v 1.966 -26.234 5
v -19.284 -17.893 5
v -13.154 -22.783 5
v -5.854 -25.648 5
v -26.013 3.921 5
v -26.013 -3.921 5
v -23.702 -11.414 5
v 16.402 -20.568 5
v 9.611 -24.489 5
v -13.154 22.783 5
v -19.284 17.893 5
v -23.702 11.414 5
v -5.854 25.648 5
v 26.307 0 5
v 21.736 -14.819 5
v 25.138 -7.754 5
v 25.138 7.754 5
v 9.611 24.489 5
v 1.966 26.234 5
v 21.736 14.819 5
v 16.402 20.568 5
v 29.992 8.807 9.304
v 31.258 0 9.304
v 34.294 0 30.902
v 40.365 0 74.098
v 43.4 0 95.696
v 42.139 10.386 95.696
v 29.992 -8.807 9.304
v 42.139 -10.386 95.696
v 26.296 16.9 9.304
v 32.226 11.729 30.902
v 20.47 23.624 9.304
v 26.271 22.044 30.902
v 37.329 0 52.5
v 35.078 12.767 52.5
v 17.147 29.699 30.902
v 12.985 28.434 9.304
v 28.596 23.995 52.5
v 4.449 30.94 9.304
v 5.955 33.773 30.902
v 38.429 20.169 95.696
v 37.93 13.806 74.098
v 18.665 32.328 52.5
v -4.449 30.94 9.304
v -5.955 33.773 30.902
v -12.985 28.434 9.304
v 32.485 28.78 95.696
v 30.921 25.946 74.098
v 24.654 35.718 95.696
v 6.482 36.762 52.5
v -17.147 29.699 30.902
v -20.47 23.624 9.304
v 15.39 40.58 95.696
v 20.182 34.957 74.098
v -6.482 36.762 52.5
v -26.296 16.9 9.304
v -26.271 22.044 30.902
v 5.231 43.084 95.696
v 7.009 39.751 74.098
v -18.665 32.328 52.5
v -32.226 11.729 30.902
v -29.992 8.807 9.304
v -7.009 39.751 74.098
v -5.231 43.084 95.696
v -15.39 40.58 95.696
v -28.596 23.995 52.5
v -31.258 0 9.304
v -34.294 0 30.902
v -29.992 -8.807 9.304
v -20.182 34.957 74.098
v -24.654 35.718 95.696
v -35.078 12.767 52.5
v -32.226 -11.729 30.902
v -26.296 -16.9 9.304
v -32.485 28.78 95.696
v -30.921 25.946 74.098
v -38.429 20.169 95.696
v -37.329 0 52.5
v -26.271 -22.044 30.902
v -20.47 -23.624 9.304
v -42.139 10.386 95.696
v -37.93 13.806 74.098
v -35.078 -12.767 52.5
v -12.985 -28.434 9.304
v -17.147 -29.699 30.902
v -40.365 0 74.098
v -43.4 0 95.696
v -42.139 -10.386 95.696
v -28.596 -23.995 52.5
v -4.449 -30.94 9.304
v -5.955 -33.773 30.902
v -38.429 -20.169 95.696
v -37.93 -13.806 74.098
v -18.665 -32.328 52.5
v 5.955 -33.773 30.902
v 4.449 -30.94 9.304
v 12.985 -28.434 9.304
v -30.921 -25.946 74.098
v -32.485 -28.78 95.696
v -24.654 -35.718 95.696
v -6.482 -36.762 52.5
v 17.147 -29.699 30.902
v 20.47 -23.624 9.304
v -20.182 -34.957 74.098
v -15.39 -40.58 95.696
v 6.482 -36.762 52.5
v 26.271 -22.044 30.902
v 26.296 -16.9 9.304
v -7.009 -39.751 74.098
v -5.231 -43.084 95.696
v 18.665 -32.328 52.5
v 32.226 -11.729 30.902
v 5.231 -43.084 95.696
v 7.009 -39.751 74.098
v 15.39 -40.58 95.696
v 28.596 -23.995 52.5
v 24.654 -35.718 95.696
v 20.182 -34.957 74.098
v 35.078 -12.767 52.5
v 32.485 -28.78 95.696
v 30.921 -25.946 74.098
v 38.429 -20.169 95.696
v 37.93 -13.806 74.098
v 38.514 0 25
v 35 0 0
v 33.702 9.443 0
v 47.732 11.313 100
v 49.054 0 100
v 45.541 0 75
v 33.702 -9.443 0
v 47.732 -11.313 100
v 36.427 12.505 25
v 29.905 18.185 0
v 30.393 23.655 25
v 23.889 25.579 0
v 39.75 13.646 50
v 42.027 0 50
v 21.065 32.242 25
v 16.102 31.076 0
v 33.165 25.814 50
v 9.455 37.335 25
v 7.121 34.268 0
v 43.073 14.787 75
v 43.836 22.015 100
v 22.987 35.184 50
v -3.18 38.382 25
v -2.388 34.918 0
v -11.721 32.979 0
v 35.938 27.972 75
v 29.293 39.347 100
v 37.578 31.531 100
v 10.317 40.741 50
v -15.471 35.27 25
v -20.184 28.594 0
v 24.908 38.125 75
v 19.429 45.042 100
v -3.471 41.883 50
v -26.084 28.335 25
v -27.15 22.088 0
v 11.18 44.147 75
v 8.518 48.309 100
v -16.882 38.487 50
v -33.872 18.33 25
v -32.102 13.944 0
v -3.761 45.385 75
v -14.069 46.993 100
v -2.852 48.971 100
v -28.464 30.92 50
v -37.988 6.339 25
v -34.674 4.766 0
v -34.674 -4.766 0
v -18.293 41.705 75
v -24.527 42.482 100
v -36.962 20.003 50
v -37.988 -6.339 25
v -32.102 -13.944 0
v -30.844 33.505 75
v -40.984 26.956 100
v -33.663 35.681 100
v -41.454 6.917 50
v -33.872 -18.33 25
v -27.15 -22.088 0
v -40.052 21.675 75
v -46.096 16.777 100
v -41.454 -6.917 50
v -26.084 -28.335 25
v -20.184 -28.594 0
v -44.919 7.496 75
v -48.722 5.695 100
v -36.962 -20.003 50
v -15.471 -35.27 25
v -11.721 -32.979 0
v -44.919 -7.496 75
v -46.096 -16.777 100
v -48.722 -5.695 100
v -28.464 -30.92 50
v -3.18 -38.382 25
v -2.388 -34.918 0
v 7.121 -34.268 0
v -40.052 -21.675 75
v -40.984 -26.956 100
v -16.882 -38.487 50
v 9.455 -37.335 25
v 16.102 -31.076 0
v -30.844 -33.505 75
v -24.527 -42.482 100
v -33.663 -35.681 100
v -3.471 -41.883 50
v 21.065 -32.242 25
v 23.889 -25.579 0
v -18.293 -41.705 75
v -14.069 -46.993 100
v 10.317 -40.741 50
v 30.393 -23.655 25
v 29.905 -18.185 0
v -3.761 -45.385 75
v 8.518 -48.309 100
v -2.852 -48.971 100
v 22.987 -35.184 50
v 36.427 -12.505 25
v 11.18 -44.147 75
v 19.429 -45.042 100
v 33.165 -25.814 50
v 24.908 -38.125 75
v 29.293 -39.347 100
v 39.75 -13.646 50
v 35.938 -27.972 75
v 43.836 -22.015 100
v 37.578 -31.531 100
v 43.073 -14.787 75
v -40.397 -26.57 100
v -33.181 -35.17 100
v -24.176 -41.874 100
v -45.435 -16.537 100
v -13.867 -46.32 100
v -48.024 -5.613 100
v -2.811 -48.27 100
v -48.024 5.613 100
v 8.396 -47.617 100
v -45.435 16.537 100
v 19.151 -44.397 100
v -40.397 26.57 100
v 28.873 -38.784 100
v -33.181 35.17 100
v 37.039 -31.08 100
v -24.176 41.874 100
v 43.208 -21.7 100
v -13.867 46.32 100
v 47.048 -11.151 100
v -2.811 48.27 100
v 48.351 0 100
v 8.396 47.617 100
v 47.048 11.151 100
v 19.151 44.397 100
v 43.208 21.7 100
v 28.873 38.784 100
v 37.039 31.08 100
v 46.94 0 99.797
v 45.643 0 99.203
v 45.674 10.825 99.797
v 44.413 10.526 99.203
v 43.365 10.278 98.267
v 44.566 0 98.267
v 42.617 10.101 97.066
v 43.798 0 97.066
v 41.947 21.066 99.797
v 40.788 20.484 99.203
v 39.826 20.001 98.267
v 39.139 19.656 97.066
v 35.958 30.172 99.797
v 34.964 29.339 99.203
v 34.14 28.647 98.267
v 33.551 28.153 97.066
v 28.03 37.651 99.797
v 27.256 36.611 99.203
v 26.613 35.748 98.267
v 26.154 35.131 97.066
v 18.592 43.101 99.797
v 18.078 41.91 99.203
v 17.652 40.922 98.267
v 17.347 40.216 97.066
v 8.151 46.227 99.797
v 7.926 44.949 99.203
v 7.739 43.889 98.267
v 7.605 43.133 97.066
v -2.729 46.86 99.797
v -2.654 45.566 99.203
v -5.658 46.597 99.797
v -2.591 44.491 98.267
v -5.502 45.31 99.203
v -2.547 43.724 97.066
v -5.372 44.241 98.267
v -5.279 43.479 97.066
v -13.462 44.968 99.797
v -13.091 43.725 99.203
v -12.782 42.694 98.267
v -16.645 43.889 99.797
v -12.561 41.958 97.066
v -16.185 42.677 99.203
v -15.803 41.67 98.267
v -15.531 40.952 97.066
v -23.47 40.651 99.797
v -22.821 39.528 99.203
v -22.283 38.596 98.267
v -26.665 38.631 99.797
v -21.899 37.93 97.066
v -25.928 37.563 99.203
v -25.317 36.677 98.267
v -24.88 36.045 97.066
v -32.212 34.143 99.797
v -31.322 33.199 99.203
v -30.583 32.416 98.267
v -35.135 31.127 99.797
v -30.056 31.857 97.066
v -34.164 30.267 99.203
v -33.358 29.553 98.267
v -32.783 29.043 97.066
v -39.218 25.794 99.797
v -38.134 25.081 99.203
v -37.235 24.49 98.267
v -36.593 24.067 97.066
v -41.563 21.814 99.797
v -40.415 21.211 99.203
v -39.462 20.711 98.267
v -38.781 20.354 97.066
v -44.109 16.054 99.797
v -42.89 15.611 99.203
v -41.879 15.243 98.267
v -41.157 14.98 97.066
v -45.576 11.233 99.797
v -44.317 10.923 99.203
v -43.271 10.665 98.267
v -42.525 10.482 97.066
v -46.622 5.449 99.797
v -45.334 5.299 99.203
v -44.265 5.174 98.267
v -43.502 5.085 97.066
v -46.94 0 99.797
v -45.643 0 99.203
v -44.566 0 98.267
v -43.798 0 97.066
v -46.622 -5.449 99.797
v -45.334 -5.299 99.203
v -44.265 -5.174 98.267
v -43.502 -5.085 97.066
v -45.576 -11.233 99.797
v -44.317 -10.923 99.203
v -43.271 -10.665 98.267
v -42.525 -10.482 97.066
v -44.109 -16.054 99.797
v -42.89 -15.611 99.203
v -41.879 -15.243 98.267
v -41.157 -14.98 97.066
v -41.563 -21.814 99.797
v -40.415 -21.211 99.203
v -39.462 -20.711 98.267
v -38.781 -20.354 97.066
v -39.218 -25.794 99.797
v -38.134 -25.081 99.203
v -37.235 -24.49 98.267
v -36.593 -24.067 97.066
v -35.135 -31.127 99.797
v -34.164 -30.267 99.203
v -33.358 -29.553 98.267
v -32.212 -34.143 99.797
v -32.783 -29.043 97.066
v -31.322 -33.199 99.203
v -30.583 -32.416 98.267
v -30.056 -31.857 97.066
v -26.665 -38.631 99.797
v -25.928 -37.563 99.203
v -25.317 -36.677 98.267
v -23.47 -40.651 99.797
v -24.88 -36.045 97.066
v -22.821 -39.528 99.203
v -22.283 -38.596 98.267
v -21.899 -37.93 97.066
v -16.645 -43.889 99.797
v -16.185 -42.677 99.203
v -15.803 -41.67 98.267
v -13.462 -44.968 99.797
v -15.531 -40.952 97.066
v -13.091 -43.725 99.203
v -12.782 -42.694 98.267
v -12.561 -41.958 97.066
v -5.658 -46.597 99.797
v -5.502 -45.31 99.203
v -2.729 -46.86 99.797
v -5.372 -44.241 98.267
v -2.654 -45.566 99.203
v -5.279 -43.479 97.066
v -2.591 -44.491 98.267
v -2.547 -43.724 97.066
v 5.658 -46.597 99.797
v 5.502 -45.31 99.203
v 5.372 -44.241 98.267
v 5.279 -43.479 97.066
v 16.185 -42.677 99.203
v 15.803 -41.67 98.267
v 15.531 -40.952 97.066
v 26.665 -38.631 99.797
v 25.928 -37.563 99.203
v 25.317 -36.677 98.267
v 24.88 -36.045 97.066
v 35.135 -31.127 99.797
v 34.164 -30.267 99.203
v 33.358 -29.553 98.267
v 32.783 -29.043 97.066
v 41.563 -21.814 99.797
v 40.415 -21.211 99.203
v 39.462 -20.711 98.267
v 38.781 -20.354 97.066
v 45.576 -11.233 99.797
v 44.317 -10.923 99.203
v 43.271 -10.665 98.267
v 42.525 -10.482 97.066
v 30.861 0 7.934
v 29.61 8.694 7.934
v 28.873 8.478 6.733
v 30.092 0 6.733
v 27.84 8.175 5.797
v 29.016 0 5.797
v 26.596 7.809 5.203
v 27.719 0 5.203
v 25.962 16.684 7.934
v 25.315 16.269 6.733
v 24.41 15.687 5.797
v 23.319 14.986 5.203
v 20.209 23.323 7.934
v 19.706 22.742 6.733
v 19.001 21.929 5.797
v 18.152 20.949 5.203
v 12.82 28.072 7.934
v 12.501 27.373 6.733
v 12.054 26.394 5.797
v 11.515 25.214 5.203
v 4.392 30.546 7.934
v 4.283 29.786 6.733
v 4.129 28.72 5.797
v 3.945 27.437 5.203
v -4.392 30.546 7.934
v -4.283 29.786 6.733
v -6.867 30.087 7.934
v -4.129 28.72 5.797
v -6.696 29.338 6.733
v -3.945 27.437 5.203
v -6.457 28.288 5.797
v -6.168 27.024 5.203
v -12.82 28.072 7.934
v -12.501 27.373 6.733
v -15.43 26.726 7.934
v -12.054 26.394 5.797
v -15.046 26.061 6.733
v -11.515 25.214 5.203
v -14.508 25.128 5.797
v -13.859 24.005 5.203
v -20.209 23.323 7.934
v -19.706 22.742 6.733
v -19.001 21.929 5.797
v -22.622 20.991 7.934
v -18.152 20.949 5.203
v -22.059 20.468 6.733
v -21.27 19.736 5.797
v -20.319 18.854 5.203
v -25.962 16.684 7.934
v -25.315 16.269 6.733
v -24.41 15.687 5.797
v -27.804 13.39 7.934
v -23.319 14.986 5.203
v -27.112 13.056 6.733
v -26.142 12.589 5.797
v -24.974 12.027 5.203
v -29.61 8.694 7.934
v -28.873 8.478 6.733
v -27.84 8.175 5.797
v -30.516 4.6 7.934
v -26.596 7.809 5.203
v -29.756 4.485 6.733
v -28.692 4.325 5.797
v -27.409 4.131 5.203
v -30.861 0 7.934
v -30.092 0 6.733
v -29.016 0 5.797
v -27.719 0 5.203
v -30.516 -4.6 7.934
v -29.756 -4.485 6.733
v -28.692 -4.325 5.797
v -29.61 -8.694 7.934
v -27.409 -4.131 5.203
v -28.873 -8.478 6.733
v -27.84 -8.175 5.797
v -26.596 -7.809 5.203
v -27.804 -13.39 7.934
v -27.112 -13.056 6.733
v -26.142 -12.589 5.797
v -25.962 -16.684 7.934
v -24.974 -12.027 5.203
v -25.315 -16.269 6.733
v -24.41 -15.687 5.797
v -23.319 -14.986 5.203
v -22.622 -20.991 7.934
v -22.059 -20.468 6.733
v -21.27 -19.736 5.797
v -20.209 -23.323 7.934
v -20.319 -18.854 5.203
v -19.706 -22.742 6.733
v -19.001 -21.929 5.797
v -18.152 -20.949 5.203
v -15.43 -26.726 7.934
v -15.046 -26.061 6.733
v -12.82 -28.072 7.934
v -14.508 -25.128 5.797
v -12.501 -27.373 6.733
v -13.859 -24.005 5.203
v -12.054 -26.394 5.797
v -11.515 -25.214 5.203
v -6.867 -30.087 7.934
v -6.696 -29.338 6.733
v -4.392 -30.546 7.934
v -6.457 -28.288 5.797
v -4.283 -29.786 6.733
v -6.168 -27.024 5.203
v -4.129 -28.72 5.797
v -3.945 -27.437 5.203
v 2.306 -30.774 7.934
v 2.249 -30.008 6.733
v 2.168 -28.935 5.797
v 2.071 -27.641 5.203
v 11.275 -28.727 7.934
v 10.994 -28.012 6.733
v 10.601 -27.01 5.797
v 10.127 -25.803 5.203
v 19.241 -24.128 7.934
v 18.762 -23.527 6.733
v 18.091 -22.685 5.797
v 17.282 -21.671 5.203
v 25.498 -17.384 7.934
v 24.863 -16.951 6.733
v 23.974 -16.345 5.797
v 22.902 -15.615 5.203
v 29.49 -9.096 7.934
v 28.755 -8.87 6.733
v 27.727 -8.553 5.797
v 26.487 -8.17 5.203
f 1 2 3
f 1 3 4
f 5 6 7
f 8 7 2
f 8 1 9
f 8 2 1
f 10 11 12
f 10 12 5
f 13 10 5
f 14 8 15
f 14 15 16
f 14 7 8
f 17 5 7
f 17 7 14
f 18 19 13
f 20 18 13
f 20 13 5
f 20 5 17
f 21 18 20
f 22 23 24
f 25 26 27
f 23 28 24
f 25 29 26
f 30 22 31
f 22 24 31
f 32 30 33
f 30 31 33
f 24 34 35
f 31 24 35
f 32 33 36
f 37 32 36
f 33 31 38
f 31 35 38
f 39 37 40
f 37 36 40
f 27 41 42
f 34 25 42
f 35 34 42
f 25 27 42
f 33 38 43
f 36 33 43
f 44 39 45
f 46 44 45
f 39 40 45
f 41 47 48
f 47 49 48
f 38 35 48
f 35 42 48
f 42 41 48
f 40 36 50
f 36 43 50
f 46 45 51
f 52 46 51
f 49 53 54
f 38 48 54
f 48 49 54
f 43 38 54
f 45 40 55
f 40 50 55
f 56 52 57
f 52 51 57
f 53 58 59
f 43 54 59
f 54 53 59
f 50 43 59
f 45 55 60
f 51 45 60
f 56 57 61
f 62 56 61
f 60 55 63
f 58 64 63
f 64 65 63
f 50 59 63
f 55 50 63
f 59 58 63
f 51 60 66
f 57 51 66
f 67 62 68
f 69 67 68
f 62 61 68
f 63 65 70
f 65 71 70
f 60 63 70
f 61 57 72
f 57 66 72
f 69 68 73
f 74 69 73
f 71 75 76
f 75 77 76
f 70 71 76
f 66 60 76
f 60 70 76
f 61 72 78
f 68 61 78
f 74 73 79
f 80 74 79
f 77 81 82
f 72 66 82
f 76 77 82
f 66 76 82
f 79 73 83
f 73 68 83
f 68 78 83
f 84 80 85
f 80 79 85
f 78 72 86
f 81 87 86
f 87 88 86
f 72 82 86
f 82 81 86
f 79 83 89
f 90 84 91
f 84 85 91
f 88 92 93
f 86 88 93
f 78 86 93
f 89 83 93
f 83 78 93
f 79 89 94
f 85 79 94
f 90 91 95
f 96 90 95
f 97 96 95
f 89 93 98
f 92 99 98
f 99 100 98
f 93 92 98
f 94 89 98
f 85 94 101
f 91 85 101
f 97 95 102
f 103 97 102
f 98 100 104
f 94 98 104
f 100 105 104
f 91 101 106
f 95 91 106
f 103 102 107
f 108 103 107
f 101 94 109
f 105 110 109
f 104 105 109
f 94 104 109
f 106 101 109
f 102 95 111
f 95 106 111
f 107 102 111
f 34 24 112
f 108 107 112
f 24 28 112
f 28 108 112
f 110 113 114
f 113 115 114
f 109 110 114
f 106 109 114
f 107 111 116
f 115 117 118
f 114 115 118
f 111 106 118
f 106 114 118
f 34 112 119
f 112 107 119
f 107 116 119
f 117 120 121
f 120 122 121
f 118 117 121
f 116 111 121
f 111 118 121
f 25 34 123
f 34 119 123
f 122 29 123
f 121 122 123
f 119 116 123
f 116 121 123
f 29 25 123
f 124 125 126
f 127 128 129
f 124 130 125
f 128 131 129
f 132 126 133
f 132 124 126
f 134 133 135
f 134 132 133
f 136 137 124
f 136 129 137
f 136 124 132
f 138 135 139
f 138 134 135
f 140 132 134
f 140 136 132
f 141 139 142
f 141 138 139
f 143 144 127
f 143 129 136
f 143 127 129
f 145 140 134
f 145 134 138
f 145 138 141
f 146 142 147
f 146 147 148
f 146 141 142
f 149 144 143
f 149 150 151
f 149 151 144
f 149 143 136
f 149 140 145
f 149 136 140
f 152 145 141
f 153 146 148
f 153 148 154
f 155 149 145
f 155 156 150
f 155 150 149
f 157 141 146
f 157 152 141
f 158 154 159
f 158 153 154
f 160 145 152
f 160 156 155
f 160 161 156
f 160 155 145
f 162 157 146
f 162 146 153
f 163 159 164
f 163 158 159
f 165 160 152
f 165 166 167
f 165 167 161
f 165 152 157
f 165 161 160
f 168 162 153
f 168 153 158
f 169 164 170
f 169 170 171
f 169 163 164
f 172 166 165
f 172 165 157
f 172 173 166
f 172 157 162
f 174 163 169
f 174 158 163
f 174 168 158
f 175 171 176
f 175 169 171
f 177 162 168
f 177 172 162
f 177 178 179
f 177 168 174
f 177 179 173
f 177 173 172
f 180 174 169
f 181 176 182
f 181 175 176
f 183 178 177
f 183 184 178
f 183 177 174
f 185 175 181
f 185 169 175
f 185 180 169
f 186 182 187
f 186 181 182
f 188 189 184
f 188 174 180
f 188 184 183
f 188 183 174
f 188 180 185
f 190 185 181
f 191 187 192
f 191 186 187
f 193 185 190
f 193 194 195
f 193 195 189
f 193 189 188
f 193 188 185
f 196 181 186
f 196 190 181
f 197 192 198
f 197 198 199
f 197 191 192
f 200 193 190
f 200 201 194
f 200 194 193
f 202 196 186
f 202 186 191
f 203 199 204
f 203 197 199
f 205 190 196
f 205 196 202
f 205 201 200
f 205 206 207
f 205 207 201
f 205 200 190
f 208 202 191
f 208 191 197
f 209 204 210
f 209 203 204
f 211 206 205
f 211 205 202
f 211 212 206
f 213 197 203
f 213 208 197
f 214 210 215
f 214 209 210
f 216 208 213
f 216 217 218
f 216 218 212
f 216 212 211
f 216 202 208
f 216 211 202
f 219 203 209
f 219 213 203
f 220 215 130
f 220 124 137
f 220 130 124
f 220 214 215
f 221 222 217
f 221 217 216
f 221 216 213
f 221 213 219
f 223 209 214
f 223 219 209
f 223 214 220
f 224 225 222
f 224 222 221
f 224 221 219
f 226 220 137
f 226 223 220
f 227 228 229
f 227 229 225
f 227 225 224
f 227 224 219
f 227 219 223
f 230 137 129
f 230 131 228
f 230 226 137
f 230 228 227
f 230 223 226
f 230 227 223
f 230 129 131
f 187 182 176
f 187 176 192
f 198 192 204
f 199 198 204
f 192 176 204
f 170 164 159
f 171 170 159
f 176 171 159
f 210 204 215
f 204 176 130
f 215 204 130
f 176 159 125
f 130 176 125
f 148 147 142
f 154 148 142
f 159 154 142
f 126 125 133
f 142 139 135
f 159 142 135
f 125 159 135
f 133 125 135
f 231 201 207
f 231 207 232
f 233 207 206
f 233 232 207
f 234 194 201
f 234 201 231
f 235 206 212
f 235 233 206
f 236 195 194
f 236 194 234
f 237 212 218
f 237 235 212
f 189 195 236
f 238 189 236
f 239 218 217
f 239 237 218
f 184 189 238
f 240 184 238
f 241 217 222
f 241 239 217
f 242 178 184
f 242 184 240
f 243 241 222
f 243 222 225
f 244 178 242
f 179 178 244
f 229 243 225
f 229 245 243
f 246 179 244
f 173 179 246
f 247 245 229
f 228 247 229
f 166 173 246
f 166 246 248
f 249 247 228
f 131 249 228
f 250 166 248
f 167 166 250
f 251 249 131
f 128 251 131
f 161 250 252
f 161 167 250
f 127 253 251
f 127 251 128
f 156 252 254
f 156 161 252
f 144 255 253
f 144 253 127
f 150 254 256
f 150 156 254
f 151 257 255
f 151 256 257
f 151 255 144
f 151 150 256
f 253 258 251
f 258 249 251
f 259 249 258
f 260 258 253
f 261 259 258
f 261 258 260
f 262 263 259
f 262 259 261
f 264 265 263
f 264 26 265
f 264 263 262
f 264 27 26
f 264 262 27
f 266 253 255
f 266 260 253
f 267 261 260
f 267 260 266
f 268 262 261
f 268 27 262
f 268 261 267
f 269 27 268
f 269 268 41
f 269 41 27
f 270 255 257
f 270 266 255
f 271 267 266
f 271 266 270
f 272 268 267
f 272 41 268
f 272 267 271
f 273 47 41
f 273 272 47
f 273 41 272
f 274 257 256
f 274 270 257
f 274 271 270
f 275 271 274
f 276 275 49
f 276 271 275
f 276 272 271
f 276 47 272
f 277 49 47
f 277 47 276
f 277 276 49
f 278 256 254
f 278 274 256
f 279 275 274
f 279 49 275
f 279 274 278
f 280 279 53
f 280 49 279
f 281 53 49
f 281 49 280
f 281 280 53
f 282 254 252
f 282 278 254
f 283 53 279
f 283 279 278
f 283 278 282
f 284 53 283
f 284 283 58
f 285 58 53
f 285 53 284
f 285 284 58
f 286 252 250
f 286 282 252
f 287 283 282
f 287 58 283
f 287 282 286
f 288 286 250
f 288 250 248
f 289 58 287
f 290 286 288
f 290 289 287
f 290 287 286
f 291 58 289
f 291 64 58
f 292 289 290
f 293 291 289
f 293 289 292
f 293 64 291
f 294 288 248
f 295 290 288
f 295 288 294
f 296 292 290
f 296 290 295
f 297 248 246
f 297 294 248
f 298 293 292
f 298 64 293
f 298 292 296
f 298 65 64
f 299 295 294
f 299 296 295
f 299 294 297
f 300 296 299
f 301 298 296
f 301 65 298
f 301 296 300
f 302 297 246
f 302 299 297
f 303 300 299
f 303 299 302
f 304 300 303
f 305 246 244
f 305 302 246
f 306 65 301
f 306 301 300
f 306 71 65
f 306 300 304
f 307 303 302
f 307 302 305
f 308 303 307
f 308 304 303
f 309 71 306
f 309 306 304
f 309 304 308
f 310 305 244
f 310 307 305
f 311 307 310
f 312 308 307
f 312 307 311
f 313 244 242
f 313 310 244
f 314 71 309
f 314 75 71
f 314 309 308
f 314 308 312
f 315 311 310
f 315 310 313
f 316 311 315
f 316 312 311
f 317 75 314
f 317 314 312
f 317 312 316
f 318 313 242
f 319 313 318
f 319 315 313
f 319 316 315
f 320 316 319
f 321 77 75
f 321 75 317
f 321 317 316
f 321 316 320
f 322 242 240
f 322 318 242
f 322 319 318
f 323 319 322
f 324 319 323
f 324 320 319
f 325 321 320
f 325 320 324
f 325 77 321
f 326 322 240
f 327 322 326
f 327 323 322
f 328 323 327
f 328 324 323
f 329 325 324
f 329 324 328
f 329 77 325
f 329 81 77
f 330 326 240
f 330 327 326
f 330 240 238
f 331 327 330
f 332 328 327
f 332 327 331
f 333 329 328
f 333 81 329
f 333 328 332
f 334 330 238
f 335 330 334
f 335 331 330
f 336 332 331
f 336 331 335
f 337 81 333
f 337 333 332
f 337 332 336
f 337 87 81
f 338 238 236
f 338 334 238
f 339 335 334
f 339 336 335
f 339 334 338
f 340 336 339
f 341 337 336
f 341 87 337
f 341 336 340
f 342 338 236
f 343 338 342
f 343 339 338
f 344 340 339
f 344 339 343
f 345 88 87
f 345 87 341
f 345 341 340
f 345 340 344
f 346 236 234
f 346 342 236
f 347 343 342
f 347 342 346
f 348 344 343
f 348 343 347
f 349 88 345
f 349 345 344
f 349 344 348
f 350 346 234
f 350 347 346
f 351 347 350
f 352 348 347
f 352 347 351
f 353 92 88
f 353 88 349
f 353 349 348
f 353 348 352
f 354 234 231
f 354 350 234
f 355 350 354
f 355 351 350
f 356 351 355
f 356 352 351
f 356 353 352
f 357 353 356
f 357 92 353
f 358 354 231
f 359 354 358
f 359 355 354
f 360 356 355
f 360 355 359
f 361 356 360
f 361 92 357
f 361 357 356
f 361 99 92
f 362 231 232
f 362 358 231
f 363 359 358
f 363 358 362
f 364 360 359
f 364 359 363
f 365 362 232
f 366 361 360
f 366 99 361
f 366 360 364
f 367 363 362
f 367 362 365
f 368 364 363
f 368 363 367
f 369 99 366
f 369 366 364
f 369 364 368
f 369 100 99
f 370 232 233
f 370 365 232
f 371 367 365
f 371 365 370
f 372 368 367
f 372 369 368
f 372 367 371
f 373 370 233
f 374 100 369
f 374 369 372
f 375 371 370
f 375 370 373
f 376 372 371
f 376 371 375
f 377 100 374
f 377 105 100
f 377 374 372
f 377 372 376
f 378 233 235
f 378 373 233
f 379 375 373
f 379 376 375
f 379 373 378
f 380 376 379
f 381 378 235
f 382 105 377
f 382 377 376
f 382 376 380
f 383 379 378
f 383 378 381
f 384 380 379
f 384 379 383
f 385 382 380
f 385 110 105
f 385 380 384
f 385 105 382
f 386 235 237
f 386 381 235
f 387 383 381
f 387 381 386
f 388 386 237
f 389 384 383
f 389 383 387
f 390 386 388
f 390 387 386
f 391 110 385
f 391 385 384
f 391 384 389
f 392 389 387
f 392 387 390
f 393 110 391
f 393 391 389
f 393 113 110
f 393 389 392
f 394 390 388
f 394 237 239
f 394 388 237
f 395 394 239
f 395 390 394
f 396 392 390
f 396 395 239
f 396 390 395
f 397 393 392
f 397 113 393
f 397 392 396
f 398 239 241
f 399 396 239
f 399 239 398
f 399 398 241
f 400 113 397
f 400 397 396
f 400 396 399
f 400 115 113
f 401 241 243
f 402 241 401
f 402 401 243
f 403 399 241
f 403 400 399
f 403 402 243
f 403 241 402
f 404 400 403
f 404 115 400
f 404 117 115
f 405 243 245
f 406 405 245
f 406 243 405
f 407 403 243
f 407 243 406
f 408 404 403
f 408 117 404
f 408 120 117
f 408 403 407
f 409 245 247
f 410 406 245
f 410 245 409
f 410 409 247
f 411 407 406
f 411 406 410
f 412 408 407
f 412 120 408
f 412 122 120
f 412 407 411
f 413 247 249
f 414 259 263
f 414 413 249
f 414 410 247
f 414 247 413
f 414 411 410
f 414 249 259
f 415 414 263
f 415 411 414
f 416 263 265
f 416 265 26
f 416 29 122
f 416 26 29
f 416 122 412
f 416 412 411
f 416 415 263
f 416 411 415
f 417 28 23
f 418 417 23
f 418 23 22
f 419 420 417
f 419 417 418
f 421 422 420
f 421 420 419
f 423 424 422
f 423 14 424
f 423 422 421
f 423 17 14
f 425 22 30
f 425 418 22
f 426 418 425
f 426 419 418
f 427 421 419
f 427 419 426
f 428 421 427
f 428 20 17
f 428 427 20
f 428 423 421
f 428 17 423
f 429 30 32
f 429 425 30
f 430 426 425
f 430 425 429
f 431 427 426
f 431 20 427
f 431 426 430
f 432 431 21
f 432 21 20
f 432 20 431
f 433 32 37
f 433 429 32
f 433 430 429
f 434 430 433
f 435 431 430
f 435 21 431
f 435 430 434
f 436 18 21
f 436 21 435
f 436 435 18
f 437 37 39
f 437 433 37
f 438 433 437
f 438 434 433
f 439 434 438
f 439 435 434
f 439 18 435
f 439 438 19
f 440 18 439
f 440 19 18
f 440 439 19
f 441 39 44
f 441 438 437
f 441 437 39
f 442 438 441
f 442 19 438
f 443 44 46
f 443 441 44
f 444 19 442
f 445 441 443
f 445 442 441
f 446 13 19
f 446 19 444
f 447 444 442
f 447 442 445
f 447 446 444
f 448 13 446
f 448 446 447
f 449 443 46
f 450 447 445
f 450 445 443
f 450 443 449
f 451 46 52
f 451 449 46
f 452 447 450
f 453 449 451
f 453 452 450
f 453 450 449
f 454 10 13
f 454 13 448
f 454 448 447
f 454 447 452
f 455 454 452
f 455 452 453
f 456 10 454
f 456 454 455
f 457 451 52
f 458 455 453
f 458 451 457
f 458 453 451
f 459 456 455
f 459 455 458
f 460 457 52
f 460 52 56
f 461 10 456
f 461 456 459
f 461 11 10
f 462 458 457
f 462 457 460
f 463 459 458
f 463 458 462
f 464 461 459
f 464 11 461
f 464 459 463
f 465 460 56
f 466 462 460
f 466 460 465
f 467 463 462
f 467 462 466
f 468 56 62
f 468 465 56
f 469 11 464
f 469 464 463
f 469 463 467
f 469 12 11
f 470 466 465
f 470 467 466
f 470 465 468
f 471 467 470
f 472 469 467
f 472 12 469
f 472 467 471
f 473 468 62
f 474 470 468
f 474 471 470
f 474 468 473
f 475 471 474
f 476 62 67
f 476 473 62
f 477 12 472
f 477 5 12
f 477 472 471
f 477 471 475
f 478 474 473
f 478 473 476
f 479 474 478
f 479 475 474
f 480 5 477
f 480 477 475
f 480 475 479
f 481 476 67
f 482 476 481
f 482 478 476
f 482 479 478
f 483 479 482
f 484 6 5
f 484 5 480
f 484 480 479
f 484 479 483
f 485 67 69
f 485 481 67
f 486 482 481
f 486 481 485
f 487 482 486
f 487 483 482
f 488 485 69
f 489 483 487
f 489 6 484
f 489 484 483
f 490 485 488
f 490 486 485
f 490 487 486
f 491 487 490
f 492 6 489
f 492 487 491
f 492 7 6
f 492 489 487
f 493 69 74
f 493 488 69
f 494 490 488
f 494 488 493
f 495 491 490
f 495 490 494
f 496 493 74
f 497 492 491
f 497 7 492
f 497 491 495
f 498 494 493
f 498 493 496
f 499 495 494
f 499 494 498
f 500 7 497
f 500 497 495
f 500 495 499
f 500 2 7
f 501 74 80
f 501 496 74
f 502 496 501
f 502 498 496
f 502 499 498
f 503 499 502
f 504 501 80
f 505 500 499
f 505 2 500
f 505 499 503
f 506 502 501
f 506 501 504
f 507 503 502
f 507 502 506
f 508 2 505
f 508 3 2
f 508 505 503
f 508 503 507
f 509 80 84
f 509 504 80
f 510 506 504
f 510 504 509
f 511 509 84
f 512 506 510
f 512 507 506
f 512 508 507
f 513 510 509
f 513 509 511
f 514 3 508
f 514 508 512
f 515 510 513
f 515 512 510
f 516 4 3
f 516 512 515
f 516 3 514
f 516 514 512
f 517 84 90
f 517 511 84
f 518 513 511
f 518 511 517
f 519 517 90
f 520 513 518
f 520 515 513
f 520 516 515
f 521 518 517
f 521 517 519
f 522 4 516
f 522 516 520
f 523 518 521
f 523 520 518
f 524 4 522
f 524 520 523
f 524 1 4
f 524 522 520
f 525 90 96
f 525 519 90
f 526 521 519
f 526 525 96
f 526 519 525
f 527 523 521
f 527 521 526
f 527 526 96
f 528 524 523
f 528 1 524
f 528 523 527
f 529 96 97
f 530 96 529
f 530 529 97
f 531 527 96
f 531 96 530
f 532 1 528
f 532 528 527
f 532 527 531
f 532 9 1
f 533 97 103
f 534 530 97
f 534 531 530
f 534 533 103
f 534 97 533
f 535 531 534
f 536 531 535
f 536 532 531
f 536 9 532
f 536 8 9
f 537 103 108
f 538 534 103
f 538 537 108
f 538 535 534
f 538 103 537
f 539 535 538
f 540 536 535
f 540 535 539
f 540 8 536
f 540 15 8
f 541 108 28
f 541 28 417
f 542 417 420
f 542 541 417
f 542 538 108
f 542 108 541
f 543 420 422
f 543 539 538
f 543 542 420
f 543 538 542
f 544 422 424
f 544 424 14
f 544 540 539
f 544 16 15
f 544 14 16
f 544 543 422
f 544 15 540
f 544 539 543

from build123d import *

# Parameters (mm, degrees)
F0_R     = 35
F1_DEPTH = 100
F1_TAPER = -8
F2_T     = -5
F3_R     = 5


with BuildPart() as f1:
    # F0 (on Top) → F1 (new body)
    with BuildSketch(Plane.XY):
        Circle(F0_R)
    extrude(amount=F1_DEPTH, taper=F1_TAPER)

    # F2
    f2_openings = [f1.faces().sort_by_distance(p)[0] for p in [
        (0, 0, 100),
    ]]
    offset(amount=F2_T, openings=f2_openings, kind=Kind.INTERSECTION)

    # F3
    f3_edges = [f1.edges().sort_by_distance(p)[0] for p in [
        (-44.004946, 0, 100),
        (-30.653566, 0, 5),
    ]]
    fillet(f3_edges, radius=F3_R)


solid = f1.part
